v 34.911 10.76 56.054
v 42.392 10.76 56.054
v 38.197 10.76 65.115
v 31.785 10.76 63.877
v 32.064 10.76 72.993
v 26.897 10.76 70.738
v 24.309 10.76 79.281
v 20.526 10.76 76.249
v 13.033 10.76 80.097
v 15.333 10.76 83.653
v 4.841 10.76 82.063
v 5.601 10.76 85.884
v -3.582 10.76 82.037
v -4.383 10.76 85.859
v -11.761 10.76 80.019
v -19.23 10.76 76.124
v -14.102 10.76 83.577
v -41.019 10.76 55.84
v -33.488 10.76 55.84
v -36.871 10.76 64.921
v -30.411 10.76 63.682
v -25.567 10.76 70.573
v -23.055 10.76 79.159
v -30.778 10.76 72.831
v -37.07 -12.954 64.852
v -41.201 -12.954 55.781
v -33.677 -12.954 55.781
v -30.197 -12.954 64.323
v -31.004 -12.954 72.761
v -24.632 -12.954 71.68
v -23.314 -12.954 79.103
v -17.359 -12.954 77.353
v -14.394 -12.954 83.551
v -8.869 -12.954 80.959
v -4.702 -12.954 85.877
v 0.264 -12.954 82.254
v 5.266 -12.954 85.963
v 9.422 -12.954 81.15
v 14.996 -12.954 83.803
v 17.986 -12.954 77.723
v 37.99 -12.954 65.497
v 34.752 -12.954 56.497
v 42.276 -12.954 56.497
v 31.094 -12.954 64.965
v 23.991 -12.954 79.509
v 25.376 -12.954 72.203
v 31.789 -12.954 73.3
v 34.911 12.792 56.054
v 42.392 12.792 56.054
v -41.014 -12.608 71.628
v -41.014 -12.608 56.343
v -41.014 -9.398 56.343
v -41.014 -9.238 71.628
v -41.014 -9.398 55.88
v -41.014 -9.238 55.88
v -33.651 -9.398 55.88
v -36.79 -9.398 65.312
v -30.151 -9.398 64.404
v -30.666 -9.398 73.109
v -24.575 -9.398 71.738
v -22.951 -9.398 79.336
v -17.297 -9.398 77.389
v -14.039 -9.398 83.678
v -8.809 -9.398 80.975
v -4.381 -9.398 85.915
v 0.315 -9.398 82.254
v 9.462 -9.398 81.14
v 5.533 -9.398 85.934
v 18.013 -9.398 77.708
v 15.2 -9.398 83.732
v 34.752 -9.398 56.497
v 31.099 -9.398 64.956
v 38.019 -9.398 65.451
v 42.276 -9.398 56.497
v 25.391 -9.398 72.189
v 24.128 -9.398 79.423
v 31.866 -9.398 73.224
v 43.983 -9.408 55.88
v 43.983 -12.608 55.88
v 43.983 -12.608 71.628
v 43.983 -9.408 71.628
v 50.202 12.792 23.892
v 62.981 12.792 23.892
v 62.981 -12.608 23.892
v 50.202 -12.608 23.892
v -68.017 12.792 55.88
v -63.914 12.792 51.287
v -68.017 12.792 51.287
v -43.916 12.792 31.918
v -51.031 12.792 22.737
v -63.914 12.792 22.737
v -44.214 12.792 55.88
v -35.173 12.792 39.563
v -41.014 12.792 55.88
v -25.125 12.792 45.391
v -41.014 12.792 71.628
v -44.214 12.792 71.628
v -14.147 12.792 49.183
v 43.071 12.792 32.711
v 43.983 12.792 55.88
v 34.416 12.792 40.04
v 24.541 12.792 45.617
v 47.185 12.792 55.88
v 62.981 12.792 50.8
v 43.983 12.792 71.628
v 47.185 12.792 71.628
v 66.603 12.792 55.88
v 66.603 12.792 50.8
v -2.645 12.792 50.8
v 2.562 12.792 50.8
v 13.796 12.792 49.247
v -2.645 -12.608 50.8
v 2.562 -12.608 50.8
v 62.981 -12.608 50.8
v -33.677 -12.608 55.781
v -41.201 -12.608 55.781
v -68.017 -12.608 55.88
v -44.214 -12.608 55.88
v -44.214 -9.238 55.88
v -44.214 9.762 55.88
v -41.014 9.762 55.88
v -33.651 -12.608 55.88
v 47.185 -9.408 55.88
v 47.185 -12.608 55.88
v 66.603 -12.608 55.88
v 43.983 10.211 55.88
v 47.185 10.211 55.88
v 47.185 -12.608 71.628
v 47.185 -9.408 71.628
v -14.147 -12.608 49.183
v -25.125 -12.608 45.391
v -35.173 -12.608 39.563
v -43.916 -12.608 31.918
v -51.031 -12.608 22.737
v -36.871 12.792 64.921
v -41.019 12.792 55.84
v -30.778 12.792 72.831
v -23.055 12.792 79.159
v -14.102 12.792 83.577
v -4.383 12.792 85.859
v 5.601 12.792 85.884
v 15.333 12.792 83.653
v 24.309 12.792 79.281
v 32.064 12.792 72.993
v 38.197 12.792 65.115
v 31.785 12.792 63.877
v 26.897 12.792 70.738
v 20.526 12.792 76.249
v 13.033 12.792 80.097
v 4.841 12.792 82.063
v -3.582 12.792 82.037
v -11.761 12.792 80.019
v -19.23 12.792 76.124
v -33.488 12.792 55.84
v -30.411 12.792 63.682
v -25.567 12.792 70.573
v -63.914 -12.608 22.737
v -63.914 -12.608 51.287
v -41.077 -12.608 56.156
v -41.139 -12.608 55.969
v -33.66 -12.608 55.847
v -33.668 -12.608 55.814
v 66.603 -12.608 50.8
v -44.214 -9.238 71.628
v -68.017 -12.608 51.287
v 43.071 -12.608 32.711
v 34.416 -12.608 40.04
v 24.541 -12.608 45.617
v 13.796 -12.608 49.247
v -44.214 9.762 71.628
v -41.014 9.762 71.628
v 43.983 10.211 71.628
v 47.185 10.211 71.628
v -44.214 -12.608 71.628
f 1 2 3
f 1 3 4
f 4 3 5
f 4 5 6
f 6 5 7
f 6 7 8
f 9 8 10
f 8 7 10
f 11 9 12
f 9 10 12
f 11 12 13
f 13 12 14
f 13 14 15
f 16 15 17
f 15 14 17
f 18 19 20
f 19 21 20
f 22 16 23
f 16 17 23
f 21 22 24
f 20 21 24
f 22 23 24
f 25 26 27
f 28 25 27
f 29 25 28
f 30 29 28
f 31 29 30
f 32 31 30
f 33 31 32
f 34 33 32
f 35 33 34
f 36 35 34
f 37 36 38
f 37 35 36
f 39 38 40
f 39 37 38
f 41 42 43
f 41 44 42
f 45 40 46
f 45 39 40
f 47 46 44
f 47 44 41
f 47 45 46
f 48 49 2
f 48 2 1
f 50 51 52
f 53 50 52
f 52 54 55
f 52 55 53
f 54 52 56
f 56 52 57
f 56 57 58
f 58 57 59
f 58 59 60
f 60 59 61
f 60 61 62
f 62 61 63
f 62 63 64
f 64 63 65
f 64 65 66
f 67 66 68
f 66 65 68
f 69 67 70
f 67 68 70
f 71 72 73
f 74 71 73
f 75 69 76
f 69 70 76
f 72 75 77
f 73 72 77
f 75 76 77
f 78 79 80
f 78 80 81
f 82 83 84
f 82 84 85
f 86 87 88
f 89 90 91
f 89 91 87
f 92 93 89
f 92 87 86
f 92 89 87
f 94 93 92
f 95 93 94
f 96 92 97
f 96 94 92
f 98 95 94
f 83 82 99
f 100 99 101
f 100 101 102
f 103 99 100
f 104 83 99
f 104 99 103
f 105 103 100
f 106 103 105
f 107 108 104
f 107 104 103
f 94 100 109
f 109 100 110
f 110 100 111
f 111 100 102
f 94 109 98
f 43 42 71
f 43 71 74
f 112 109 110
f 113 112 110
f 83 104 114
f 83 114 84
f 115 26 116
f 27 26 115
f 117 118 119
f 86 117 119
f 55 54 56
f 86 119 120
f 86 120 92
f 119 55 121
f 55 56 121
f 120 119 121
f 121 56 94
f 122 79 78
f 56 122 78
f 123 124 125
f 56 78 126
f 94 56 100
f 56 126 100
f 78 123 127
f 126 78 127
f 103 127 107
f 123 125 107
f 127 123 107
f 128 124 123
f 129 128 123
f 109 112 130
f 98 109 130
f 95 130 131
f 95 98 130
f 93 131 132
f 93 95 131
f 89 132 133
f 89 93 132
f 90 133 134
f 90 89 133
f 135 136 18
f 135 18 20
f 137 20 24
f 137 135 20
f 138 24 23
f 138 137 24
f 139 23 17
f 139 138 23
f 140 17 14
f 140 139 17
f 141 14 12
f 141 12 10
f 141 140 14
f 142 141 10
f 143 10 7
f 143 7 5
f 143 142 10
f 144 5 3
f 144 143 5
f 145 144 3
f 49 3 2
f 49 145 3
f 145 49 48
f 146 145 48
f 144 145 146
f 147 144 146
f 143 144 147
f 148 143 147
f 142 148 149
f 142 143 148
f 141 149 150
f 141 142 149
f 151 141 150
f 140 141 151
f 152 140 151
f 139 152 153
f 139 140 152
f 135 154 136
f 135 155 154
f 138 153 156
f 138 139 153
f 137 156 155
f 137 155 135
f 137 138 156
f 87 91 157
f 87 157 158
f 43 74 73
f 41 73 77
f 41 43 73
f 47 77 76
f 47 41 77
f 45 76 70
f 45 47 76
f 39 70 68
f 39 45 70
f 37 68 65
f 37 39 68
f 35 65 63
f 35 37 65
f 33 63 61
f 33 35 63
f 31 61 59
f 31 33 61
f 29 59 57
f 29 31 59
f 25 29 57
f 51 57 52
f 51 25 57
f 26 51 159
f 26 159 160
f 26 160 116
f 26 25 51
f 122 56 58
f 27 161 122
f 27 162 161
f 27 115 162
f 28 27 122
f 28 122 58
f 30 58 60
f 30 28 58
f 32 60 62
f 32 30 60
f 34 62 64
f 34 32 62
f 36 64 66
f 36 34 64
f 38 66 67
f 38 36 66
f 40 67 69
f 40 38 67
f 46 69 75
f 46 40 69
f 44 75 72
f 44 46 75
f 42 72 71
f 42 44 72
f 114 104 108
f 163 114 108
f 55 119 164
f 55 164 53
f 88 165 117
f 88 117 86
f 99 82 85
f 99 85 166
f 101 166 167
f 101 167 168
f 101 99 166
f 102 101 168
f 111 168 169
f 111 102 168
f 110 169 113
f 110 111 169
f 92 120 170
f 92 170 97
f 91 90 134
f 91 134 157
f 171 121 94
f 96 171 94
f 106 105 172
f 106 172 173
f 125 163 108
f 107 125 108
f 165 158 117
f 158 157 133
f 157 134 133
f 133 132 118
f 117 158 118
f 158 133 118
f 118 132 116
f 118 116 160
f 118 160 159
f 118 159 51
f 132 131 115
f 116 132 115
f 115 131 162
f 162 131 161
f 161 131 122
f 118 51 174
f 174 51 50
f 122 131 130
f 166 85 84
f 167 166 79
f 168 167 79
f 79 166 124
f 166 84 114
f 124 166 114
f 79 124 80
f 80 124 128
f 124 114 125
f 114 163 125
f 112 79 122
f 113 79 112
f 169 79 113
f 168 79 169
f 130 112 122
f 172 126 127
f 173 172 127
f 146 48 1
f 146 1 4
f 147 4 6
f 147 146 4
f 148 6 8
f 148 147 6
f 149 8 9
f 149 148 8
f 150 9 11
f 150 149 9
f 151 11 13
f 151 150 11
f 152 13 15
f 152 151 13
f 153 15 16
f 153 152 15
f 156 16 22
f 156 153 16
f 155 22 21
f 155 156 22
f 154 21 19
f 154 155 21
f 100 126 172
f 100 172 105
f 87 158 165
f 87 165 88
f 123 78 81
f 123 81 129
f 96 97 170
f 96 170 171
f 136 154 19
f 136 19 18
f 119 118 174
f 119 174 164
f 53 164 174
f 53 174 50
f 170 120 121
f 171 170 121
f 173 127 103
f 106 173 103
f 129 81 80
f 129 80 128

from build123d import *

# Parameters (mm, degrees)
F3_W      = 127
F3_H      = 25.4
F4_DEPTH  = 5.08
F5_W      = 3.2020173967
F5_H      = 2.5810918153
F5_H_2    = 3.2004
F5_W_2    = 3.2004
F5_H_3    = 3.030332116
F5_H_4    = 3.370467884
F6_DEPTH  = 15.748
F9_DEPTH  = 25.4
F10_DEPTH = 7.62
F13_DEPTH = 3.556
F14_DEPTH = 2.032


with BuildPart() as f4:
    # F3 (on offset) → F4 (new body)
    with BuildSketch(Plane.XY.offset(50.8)):
        with Locations((3.1030103564, 0.0919504733)):
            Rectangle(F3_W, F3_H)
    extrude(amount=F4_DEPTH)

    # F5 (on face) → F6 (join)
    with BuildSketch(Plane.XY.offset(55.88)):
        with Locations((45.5839950591, 11.5014045656)):
            Rectangle(F5_W, F5_H)
        with Locations((45.5839950591, -11.0078495267)):
            Rectangle(F5_W, F5_H_2)
        with Locations((-42.6142088447, 11.2767844153)):
            Rectangle(F5_W_2, F5_H_3)
        with Locations((-42.6142088447, -10.9228155847)):
            Rectangle(F5_W_2, F5_H_4)
    extrude(amount=F6_DEPTH)

    # F8 (on offset) → F9 (join)
    with BuildSketch(Plane(origin=(0, 12.7919504733, 0), x_dir=(-1, 0, 0), z_dir=(0, 1, 0))):
        with BuildLine():
            Line((63.9144031451, 22.7373477172), (63.9144031451, 51.2869477172))
            Line((63.9144031451, 51.2869477172), (-62.980983232, 51.2869477172))
            Line((-62.980983232, 51.2869477172), (-62.980983232, 23.8919413011))
            Line((-62.980983232, 23.8919413011), (-50.2015098581, 23.8919413011))
            ThreePointArc((-50.2015098581, 23.8919413011), (0.729046025, 50.8523148548), (51.0314504165, 22.7373477172))
            Line((51.0314504165, 22.7373477172), (63.9144031451, 22.7373477172))
        make_face()
    extrude(amount=-F9_DEPTH)

    # F10 (add): a face of the model
    f10_faces = [f4.faces().sort_by_distance(p)[0] for p in [
        (-60.3969896436, 0.0919504733, 53.5834738586),
    ]]
    extrude(f10_faces, amount=F10_DEPTH)

    # F12 (on offset) → F13 (join)
    with BuildSketch(Plane.XZ.offset(12.954)):
        with BuildLine():
            Line((34.7522422671, 56.4973130822), (42.2758869827, 56.4973130822))
            ThreePointArc((42.2758869827, 56.4973130822), (0.279509926, 86.2029094565), (-41.2007495761, 55.7807758451))
            Line((-41.2007495761, 55.7807758451), (-33.6771048605, 55.7807758451))
            ThreePointArc((-33.6771048605, 55.7807758451), (0.264117723, 82.2536287212), (34.7522422671, 56.4973130822))
        make_face()
    extrude(amount=-F13_DEPTH)


with BuildPart() as f14:
    # F11 (on offset) → F14 (new body)
    with BuildSketch(Plane(origin=(0, 12.7919504733, 0), x_dir=(-1, 0, 0), z_dir=(0, 1, 0))):
        with BuildLine():
            Line((33.4876855967, 55.8397546411), (41.0189045158, 55.8397546411))
            ThreePointArc((41.0189045158, 55.8397546411), (-0.6087174648, 86.1564382353), (-42.3918627203, 56.0544617474))
            Line((-42.3918627203, 56.0544617474), (-34.9106043577, 56.0544617474))
            ThreePointArc((-34.9106043577, 56.0544617474), (-0.6287310234, 82.3015137584), (33.4876855967, 55.8397546411))
        make_face()
    extrude(amount=-F14_DEPTH)


solid = Compound([f4.part, f14.part])
